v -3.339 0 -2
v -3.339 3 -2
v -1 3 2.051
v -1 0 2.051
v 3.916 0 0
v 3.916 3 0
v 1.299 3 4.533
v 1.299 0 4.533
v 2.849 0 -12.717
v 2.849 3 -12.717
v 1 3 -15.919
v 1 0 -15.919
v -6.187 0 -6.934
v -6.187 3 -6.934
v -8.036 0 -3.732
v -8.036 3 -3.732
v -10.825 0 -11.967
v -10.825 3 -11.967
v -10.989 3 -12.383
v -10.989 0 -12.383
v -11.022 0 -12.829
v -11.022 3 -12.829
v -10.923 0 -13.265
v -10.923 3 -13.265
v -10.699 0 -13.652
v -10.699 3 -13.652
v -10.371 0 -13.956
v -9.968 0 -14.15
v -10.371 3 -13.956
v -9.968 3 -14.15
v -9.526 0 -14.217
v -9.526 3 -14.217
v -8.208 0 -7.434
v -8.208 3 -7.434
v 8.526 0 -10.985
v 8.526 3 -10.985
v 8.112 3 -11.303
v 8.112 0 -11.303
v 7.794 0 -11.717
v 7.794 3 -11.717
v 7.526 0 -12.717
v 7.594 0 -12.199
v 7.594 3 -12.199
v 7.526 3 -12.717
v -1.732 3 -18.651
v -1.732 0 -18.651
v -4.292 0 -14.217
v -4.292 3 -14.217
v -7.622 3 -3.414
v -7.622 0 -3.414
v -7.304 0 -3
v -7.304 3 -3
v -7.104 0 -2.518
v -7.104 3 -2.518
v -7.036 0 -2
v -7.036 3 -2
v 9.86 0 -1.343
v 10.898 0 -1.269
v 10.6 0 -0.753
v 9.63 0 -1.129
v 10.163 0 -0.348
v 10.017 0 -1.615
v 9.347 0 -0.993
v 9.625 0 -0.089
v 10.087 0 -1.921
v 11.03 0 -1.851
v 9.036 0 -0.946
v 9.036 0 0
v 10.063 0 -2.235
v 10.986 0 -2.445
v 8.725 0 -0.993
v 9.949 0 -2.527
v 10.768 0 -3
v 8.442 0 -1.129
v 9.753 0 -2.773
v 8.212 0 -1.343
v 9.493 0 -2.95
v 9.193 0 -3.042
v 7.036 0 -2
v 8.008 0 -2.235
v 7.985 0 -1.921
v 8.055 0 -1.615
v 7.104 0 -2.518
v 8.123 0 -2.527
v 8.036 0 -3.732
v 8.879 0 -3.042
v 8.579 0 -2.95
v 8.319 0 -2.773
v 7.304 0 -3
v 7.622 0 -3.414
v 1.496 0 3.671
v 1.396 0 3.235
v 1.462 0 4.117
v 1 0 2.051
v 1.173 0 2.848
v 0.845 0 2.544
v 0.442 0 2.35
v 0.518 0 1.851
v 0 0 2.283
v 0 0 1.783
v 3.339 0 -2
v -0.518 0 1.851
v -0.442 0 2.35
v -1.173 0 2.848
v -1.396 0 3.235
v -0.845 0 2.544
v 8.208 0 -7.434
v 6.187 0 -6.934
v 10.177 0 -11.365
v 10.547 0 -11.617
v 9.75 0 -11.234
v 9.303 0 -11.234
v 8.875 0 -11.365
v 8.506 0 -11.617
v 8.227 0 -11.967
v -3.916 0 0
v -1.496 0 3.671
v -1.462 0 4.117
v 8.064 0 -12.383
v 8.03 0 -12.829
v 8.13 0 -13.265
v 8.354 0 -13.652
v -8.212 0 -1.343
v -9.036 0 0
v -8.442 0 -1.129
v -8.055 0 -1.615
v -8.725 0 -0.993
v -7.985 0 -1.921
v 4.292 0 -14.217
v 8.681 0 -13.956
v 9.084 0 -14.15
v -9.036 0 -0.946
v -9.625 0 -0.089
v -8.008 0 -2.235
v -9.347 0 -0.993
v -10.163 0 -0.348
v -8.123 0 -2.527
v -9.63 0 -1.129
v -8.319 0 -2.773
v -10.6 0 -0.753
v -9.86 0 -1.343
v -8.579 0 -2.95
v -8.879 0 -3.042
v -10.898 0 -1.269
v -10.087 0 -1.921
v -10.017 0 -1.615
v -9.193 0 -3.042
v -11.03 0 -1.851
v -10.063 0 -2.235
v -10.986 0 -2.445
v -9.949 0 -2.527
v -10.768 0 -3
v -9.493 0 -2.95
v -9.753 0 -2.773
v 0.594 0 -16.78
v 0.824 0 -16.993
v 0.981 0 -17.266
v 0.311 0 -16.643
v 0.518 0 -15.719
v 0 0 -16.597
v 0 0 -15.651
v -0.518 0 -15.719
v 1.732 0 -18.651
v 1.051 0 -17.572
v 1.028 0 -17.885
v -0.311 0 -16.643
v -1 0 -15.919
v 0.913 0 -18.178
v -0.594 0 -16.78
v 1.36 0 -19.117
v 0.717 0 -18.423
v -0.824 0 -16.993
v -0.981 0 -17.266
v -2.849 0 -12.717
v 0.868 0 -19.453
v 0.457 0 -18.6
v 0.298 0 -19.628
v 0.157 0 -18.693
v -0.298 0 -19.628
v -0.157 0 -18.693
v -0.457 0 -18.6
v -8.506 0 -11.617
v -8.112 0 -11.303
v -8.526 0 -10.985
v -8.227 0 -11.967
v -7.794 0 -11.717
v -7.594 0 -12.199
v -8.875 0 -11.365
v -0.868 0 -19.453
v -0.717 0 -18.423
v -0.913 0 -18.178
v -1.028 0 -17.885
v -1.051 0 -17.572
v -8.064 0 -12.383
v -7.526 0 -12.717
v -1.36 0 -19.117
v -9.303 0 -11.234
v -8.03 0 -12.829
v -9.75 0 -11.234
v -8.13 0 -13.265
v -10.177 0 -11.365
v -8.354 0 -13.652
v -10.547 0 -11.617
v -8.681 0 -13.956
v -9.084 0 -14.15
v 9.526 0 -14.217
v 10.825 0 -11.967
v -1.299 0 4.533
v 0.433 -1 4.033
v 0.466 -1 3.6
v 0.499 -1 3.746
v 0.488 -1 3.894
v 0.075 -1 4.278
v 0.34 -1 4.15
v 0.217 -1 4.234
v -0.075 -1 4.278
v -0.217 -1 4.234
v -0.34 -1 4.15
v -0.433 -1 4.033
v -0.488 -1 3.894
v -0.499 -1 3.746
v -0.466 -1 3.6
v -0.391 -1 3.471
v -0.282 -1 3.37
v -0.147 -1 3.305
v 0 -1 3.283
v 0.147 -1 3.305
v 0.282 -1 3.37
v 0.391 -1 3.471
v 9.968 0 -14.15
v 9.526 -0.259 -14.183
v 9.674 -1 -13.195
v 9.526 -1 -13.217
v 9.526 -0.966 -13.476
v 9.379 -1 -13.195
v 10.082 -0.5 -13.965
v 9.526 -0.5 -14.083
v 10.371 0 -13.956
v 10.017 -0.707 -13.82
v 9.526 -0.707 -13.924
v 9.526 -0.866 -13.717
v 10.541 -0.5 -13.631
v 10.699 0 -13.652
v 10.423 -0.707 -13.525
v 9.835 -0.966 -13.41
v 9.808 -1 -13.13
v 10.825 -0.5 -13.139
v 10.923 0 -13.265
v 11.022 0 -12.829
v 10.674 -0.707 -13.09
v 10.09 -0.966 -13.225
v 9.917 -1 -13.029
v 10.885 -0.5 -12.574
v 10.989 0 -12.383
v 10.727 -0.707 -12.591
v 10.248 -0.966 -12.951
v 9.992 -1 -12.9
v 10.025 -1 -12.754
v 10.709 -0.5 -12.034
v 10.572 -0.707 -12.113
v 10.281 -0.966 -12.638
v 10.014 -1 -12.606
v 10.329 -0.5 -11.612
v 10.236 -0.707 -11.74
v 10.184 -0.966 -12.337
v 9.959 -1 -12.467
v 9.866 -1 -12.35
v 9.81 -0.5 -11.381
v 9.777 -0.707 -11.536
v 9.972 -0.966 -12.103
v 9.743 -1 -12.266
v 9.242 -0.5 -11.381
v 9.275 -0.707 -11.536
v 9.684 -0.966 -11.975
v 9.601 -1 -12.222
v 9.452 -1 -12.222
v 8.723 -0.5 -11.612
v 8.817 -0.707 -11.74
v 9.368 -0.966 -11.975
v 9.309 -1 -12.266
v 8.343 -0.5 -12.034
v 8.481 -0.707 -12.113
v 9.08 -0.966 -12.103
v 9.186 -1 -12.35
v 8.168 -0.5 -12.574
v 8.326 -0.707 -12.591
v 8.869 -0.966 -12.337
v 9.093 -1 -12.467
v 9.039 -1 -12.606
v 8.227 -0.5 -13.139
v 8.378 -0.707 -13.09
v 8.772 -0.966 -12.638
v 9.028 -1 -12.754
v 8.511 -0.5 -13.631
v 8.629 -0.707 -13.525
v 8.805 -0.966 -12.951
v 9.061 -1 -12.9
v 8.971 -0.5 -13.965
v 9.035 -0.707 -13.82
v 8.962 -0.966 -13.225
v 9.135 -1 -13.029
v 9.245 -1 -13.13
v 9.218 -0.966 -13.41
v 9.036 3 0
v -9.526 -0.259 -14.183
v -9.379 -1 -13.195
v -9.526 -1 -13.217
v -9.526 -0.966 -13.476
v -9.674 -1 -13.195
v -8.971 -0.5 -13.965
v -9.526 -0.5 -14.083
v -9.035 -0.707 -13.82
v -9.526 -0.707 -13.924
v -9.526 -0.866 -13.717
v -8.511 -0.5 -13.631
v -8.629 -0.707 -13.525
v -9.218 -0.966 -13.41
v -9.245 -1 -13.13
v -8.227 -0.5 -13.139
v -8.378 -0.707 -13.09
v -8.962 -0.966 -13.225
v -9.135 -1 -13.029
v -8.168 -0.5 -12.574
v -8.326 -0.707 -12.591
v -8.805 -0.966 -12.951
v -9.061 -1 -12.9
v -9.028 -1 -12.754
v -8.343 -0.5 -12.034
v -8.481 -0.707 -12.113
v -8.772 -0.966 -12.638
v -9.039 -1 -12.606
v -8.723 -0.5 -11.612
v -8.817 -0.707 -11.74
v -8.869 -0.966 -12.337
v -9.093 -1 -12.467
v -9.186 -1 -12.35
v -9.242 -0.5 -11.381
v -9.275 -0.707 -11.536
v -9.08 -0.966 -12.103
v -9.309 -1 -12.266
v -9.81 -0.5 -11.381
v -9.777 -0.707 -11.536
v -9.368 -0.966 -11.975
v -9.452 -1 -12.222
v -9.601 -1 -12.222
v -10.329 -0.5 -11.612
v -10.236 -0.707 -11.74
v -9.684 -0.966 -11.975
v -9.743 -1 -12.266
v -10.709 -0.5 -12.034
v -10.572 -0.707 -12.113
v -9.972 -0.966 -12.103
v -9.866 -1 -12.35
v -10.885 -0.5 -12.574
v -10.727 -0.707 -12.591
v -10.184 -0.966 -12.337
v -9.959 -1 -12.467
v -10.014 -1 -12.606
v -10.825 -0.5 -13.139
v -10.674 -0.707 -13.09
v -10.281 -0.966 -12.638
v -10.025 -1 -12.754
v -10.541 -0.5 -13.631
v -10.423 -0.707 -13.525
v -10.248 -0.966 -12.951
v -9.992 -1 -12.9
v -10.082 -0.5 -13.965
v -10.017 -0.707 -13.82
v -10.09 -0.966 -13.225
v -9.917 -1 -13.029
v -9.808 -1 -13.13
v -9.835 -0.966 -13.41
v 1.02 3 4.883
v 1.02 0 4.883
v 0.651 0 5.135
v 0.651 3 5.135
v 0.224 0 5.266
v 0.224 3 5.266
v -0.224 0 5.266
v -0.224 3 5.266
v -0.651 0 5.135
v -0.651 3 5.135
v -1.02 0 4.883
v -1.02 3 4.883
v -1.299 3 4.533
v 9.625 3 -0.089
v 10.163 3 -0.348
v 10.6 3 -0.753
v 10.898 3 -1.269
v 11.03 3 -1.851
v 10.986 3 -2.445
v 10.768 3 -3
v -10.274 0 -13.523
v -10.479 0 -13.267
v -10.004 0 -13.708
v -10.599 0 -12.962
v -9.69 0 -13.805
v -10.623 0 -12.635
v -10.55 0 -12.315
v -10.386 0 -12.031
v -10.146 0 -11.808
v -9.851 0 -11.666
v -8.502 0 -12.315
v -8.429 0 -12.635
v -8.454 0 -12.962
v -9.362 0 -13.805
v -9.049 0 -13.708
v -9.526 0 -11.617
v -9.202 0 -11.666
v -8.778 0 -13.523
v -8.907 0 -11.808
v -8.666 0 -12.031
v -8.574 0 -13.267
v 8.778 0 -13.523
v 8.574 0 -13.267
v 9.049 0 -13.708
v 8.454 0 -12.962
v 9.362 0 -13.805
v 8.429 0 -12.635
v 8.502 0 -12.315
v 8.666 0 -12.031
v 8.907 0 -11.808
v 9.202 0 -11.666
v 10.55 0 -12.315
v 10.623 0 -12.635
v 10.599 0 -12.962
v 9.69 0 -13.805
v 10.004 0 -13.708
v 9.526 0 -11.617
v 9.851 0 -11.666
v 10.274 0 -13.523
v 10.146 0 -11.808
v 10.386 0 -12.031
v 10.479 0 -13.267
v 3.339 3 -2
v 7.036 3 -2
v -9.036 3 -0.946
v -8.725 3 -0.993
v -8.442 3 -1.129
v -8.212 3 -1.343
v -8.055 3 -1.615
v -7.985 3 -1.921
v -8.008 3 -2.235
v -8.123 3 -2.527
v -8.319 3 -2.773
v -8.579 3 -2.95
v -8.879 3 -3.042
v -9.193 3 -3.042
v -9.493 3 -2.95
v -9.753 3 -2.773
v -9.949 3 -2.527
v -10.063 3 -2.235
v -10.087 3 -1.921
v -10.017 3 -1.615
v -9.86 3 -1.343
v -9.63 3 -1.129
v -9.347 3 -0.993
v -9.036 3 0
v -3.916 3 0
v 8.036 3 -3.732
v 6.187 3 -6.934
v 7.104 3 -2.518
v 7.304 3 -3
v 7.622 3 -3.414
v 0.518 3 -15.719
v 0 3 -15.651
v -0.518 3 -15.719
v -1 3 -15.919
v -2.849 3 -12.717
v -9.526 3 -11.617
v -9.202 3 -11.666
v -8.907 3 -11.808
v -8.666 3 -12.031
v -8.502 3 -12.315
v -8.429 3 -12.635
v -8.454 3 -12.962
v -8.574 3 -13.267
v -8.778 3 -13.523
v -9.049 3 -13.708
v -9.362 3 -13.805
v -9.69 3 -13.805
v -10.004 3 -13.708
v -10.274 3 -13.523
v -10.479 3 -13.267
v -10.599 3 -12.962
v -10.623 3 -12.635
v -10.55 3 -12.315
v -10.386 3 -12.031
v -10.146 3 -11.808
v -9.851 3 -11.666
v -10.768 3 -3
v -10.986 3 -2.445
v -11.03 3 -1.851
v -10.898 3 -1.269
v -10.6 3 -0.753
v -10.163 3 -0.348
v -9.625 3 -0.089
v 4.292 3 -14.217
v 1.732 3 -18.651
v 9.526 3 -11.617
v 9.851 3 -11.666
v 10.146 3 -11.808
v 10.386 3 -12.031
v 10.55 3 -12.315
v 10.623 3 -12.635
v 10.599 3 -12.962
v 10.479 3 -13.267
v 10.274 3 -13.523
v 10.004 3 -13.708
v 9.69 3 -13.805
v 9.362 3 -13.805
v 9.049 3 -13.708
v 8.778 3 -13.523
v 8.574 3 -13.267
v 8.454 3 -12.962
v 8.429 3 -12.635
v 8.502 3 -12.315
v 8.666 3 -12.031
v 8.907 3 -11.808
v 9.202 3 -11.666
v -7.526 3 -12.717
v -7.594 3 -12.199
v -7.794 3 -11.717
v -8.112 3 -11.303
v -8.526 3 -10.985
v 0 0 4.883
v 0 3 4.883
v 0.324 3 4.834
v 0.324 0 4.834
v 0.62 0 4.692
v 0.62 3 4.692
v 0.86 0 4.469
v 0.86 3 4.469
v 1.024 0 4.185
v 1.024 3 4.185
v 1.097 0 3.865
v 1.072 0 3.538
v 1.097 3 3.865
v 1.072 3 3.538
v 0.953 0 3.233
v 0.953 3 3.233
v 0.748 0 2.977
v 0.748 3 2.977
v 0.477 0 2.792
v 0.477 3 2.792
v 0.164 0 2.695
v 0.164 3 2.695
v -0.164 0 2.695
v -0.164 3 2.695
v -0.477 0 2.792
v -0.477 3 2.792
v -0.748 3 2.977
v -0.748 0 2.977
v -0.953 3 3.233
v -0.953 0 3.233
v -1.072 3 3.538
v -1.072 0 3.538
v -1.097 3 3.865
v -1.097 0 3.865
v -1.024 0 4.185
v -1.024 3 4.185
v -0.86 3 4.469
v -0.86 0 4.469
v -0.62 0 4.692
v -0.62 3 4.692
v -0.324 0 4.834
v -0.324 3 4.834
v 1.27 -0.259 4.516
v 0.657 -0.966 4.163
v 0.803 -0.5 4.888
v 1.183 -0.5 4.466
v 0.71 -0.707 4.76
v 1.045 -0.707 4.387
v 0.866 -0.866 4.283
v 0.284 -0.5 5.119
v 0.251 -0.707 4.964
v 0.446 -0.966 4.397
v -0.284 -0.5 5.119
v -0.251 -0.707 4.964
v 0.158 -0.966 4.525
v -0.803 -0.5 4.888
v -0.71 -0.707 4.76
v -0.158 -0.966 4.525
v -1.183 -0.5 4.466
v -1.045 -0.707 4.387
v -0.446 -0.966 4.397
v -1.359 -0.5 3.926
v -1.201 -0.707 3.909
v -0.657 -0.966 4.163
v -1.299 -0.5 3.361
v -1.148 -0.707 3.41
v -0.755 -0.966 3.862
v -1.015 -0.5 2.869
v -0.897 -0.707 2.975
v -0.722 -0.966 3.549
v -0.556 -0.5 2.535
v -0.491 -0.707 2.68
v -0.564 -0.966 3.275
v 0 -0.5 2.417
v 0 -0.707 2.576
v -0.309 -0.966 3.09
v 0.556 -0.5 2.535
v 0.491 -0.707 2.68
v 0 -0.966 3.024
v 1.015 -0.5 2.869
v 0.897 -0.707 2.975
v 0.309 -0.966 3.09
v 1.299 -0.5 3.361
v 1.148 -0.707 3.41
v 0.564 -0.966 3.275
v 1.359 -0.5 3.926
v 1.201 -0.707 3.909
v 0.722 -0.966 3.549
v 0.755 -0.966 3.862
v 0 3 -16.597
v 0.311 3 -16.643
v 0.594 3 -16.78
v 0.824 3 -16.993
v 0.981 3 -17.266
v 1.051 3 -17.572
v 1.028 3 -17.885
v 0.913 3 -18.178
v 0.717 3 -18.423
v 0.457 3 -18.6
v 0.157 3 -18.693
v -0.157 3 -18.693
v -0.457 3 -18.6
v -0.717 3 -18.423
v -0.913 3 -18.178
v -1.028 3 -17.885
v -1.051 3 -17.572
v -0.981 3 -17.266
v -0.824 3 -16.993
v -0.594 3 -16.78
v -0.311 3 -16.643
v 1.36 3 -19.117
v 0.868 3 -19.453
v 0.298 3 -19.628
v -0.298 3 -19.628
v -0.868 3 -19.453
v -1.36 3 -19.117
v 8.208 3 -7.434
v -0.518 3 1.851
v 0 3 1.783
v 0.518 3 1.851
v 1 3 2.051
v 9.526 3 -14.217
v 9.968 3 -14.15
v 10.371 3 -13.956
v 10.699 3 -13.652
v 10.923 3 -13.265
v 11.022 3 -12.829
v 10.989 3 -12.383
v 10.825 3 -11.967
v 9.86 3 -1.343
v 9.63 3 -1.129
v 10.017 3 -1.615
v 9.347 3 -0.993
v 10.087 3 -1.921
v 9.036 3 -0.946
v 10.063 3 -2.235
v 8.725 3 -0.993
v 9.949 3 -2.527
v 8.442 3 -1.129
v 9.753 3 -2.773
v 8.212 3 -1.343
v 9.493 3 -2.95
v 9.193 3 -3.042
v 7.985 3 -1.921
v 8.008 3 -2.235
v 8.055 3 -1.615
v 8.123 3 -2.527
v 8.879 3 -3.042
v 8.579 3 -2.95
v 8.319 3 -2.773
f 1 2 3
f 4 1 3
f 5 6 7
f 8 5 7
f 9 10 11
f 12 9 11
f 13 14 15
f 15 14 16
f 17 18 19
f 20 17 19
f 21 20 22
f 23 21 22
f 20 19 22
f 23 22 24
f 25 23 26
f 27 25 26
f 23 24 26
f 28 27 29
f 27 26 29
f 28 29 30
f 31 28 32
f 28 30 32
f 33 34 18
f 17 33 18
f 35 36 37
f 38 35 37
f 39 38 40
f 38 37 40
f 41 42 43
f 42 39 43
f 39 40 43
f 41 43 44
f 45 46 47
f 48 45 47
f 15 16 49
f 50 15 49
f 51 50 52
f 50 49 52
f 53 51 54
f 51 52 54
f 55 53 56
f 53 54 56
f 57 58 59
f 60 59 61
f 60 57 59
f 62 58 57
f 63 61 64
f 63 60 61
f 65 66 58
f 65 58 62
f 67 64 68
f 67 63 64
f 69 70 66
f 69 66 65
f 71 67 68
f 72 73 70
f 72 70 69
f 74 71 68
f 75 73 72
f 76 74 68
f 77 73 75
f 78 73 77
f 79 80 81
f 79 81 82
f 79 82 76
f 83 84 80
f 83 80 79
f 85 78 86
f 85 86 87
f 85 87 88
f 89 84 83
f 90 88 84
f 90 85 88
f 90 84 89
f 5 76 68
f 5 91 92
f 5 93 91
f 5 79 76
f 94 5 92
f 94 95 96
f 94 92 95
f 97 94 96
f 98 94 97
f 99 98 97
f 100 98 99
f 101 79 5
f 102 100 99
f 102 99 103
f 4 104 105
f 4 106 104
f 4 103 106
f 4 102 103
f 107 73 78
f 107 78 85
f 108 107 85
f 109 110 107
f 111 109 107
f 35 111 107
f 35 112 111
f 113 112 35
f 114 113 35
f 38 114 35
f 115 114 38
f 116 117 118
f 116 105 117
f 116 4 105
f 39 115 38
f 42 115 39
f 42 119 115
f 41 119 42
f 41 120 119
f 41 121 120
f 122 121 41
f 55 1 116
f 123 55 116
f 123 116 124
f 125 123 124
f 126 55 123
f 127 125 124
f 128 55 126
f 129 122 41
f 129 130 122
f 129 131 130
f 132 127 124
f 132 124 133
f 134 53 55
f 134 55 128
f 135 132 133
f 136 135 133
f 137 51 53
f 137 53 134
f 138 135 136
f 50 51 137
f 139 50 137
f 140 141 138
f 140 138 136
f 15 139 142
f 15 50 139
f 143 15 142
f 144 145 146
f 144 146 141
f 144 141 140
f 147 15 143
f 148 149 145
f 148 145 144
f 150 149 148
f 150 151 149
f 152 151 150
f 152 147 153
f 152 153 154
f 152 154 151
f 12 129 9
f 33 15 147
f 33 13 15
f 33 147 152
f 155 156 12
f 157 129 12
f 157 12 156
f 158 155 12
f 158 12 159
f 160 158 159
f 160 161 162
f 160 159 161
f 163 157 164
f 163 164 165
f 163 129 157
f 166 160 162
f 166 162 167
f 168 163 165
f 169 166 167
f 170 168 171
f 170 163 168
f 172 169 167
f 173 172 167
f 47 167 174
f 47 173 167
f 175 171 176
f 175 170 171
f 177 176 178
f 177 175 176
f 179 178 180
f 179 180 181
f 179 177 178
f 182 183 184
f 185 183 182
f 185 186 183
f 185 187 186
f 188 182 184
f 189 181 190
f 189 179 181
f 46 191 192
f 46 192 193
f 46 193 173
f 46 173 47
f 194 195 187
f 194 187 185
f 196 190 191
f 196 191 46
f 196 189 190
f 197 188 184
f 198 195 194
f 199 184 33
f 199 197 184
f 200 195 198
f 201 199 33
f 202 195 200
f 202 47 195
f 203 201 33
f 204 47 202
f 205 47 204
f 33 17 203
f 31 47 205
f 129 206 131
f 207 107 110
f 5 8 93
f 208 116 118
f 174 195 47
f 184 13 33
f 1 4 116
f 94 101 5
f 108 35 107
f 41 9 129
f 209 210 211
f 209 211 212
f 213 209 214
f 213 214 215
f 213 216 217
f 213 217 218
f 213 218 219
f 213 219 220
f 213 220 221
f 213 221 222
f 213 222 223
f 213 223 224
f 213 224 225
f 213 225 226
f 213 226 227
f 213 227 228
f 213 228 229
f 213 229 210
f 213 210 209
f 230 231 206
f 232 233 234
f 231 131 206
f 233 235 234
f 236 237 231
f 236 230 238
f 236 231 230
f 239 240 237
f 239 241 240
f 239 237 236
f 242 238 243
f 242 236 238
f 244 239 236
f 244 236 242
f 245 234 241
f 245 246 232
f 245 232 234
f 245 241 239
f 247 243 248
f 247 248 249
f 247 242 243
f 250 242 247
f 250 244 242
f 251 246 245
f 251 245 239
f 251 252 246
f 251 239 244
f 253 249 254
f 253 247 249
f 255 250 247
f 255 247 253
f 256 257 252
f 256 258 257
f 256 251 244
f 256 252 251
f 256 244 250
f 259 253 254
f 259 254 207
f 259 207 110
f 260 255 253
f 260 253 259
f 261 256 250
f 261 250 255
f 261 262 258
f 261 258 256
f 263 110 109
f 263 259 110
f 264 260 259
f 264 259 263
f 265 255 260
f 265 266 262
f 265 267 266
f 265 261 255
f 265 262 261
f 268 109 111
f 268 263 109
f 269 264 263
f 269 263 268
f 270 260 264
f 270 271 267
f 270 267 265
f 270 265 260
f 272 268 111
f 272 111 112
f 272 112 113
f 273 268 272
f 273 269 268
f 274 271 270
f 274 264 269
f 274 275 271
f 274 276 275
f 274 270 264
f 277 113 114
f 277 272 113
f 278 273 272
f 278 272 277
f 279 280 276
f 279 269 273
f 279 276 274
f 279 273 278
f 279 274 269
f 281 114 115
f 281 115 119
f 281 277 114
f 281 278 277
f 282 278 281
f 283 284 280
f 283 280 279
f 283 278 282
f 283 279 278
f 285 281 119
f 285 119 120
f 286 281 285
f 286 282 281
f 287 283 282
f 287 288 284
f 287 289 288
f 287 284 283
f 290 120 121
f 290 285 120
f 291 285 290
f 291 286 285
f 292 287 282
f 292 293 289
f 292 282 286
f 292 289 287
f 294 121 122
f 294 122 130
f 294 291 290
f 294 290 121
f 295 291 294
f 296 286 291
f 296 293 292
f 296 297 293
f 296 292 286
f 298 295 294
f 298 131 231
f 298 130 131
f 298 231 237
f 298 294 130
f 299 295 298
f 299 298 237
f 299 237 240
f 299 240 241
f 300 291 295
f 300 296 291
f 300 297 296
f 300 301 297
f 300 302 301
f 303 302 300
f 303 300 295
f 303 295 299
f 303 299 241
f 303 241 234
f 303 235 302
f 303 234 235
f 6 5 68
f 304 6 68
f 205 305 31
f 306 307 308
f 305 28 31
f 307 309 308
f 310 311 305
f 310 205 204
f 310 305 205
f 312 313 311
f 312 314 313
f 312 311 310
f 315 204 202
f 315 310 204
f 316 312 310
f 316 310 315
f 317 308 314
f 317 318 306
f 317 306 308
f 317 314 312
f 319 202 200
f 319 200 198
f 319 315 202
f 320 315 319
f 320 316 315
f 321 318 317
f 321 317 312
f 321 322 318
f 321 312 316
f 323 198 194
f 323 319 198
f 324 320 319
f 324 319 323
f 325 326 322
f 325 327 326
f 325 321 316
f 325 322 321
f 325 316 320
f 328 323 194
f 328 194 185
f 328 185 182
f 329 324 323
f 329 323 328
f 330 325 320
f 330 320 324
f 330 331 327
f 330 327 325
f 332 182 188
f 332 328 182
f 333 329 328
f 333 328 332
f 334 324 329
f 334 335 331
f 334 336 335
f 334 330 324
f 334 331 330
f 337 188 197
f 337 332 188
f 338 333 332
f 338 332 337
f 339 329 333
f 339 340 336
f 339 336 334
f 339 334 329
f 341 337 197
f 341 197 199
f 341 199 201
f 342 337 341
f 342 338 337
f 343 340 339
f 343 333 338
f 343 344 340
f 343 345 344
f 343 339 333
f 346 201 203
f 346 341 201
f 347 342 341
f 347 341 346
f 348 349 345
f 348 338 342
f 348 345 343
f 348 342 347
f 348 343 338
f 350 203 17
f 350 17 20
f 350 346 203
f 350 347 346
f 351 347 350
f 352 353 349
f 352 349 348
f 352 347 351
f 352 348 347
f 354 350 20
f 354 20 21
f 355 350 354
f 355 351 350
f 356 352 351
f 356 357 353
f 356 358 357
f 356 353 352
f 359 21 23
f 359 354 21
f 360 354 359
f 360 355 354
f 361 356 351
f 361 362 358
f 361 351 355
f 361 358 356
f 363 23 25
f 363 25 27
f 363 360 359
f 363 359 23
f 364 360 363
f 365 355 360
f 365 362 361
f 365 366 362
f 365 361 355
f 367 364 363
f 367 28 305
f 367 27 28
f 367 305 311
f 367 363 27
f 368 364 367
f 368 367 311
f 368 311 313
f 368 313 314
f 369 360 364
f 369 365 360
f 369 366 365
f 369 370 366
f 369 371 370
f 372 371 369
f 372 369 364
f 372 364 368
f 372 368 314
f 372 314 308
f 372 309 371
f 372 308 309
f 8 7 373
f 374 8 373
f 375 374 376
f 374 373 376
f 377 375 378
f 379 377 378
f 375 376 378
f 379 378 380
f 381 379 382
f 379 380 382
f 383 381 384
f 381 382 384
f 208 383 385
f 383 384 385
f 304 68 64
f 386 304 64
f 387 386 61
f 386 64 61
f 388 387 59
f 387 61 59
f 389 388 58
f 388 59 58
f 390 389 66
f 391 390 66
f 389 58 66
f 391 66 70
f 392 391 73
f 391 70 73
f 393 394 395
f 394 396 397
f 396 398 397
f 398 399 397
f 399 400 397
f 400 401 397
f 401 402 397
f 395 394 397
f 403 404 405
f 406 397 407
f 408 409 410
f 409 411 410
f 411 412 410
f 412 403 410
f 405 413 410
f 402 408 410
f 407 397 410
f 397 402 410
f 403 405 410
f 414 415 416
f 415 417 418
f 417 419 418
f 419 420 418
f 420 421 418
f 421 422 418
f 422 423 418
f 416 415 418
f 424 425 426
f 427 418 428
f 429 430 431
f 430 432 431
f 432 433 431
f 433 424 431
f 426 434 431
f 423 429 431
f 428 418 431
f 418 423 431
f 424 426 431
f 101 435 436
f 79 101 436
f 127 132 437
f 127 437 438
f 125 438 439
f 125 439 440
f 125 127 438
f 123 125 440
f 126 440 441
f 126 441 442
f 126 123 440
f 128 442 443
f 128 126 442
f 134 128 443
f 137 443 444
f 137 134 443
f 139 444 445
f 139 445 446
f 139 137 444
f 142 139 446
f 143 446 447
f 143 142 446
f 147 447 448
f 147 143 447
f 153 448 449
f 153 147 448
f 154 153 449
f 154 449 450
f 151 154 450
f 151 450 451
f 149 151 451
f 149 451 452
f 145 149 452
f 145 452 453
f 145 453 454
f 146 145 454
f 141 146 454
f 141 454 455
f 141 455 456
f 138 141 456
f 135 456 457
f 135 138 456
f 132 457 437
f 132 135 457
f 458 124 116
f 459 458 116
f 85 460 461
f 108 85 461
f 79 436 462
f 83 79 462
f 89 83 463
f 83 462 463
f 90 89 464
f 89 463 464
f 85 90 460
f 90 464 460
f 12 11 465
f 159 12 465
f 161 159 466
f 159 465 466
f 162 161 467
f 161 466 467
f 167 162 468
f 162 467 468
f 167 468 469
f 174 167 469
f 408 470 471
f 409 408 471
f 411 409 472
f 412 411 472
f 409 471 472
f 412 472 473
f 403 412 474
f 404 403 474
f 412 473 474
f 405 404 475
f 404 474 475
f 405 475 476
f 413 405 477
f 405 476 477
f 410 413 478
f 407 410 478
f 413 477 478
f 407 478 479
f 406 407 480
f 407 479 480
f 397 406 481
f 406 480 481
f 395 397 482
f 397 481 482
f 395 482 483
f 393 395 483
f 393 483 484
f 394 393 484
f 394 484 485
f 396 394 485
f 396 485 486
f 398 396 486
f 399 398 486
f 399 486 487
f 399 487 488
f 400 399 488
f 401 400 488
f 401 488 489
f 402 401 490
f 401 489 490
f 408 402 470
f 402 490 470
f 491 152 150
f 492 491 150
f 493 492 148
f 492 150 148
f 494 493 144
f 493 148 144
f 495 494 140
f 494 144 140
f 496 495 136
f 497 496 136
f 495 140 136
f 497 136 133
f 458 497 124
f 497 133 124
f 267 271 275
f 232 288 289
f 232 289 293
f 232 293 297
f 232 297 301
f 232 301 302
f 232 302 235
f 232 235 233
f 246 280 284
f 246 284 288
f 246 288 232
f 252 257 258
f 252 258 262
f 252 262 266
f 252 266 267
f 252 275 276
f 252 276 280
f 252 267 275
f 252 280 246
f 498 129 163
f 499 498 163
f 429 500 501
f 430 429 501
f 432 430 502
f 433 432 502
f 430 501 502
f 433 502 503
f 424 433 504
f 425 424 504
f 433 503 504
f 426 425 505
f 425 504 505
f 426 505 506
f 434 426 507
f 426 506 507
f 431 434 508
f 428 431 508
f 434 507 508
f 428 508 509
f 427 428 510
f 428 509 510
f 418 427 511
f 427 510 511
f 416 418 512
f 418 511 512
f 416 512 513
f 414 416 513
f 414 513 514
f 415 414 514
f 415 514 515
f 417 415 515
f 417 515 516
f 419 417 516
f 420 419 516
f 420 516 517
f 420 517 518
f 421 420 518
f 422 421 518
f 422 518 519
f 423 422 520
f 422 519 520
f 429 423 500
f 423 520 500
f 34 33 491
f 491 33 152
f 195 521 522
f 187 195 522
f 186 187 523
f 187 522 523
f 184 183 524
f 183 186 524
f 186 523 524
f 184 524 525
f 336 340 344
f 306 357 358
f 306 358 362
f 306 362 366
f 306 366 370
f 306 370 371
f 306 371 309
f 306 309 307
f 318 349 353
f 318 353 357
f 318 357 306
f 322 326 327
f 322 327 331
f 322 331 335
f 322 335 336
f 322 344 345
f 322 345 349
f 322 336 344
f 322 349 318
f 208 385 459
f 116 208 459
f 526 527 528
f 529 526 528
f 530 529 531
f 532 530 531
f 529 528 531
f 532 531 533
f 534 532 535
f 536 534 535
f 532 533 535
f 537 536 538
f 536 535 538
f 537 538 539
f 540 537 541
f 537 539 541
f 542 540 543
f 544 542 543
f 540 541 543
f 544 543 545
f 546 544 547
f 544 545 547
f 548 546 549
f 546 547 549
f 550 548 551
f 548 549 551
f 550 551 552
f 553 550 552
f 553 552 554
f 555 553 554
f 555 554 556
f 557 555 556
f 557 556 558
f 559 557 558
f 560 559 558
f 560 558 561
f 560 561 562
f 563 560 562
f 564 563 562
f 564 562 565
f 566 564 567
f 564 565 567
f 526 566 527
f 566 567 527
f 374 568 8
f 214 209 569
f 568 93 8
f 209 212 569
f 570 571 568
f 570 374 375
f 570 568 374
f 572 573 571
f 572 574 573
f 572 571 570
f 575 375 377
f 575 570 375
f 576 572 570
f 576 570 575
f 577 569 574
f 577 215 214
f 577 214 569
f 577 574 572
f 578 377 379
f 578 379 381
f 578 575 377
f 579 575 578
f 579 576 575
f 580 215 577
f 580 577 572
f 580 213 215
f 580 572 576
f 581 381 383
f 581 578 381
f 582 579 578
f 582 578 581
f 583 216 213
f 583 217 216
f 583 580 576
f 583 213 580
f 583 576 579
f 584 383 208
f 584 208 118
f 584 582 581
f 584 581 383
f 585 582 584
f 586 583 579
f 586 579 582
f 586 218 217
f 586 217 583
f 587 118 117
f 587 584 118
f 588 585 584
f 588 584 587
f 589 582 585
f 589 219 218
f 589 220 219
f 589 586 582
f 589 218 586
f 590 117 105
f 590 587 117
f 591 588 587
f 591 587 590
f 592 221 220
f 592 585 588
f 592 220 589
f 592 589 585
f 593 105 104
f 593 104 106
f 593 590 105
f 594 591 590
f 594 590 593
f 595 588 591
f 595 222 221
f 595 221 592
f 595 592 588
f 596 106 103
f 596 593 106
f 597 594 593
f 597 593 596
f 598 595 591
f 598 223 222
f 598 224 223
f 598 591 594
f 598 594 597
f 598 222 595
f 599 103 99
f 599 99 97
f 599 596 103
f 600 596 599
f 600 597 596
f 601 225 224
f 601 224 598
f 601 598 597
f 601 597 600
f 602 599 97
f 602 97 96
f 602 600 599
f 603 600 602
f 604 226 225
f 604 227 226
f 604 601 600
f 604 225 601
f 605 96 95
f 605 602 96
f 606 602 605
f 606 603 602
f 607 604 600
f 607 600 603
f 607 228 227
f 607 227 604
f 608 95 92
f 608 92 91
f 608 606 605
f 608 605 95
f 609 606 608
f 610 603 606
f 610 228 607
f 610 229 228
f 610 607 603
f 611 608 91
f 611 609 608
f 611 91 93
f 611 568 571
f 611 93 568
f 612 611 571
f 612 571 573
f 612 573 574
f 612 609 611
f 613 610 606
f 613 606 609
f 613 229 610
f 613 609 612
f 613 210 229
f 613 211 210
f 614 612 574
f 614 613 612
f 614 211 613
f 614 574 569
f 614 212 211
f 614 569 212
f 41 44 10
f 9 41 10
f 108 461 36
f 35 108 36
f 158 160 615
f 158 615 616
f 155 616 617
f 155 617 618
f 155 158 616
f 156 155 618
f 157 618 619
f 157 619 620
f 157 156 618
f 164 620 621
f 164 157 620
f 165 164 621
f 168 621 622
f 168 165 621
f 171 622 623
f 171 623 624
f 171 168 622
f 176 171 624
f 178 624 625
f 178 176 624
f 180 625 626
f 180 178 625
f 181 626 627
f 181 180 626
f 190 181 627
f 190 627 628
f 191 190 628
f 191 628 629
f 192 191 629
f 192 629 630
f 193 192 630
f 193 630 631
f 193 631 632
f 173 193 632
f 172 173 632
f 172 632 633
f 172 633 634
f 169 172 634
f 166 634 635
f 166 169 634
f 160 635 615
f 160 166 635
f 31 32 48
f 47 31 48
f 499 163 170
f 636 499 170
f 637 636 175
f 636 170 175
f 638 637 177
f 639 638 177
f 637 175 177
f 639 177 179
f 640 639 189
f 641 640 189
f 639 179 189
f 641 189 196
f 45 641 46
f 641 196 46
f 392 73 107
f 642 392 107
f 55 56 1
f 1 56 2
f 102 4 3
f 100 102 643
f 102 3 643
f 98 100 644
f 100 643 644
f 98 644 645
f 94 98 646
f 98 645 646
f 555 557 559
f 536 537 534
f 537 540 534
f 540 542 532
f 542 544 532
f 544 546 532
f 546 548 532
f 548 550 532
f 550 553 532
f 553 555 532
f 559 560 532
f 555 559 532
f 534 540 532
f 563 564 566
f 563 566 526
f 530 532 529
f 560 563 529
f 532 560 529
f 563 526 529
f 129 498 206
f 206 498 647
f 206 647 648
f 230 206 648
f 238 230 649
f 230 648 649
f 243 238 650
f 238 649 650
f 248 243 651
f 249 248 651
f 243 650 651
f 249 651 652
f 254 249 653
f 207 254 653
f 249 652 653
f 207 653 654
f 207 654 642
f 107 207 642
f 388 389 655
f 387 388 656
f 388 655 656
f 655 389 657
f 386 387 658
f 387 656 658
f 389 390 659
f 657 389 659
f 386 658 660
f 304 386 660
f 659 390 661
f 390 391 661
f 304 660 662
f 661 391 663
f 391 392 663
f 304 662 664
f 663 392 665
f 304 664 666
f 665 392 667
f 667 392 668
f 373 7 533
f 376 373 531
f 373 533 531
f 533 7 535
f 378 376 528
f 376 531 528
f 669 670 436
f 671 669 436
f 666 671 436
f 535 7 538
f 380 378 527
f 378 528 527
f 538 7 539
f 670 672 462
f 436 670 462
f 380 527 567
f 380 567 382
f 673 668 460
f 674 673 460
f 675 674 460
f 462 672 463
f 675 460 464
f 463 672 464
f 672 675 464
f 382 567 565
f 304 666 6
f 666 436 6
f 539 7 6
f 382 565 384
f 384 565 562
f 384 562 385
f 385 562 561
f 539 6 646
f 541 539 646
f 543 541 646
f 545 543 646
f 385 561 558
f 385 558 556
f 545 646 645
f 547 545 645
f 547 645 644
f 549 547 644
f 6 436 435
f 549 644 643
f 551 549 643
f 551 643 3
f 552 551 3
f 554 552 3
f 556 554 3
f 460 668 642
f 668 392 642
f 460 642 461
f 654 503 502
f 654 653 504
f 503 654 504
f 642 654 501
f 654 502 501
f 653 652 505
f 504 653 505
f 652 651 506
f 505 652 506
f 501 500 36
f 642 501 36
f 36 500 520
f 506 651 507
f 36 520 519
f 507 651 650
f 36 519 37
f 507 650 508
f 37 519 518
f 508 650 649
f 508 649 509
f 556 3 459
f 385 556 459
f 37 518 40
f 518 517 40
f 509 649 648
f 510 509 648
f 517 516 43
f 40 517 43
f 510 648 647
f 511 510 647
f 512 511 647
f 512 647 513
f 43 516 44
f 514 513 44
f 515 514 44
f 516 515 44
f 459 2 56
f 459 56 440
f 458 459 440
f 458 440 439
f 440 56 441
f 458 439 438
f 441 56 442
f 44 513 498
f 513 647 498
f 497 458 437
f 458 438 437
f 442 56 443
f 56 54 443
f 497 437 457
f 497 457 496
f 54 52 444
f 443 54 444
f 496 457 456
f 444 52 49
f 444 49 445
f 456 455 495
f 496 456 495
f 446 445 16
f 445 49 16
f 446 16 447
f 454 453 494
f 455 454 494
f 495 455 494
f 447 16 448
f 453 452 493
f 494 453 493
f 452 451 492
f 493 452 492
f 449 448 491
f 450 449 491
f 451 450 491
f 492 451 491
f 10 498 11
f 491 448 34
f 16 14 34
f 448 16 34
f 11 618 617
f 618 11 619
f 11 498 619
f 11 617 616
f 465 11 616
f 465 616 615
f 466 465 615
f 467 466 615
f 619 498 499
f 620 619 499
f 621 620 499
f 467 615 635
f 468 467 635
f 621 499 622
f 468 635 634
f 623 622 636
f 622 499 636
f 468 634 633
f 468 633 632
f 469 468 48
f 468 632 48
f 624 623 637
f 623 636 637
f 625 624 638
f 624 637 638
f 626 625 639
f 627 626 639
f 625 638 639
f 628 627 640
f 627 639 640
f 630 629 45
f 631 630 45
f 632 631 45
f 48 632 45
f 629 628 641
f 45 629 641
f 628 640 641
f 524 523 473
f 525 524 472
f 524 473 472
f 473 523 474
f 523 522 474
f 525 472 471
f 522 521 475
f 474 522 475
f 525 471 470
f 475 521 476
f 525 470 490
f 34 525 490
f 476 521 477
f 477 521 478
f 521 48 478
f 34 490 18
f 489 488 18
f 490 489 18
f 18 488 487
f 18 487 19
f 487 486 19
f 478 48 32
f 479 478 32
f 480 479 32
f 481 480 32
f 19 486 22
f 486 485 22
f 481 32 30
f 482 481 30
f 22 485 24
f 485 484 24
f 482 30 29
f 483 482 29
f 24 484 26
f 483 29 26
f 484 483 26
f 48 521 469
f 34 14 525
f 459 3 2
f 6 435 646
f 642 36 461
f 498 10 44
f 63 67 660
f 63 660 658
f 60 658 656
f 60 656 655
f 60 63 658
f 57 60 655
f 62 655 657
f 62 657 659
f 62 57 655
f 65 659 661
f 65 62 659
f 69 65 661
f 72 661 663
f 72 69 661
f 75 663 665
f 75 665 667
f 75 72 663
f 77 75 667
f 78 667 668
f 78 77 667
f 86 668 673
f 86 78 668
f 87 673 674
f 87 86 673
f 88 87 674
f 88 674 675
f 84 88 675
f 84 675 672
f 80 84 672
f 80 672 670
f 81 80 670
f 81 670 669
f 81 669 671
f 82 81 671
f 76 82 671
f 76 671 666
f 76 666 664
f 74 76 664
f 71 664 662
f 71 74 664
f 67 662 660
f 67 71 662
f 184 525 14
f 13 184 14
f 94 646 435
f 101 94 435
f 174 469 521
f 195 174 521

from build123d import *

# Parameters (mm, degrees)
SKETCH1_R           = 1.054
BOSS_EXTRUDE1_DEPTH = 3
SKETCH3_R           = 1.1
BOSS_EXTRUDE2_DEPTH = 3
CUT_EXTRUDE1_DEPTH  = 23.736281859
SKETCH4_R           = 1.5
BOSS_EXTRUDE3_DEPTH = 1
FILLET1_R           = 1


with BuildPart() as part:
    # Sketch1 → Boss-Extrude1 (new body)
    with BuildSketch(Plane(origin=(0, 0, 0), x_dir=(1, 0, 0), z_dir=(0, 1, 0))):
        with BuildLine():
            Line((0, 0), (9.035898385, 0))
            ThreePointArc((9.035898385, 0), (10.767949192, 1), (10.767949192, 3))
            Line((10.767949192, 3), (1.732050808, 18.650635095))
            ThreePointArc((1.732050808, 18.650635095), (0, 19.650635095), (-1.732050808, 18.650635095))
            Line((-1.732050808, 18.650635095), (-10.767949192, 3))
            ThreePointArc((-10.767949192, 3), (-10.767949192, 1), (-9.035898385, 0))
            Line((-9.035898385, 0), (0, 0))
        make_face()
        with Locations(Location((0, 17.650635095, 0), (0, 0, 270))):
            Circle(SKETCH1_R, mode=Mode.SUBTRACT)
        with Locations(Location((-9.035898385, 2, 0), (0, 0, 270))):
            Circle(SKETCH1_R, mode=Mode.SUBTRACT)
        with Locations(Location((9.035898385, 2, 0), (0, 0, 270))):
            Circle(SKETCH1_R, mode=Mode.SUBTRACT)
    extrude(amount=BOSS_EXTRUDE1_DEPTH)

    # Sketch3 → Boss-Extrude2 (add)
    with BuildSketch(Plane(origin=(0, 3, 0), x_dir=(1, 0, 0), z_dir=(0, 1, 0))):
        with BuildLine():
            Line((-9.526279442, 14.216878365), (9.526279442, 14.216878365))
            ThreePointArc((9.526279442, 14.216878365), (10.825317547, 13.466878365), (10.825317547, 11.966878365))
            Line((10.825317547, 11.966878365), (1.299038106, -4.533121635))
            ThreePointArc((1.299038106, -4.533121635), (0, -5.283121635), (-1.299038106, -4.533121635))
            Line((-1.299038106, -4.533121635), (-10.825317547, 11.966878365))
            ThreePointArc((-10.825317547, 11.966878365), (-10.825317547, 13.466878365), (-9.526279442, 14.216878365))
        make_face()
        with Locations(Location((0, -3.783121635, 0), (0, 0, 270))):
            Circle(SKETCH3_R, mode=Mode.SUBTRACT)
        with Locations(Location((-9.526279442, 12.716878365, 0), (0, 0, 270))):
            Circle(SKETCH3_R, mode=Mode.SUBTRACT)
        with Locations(Location((9.526279442, 12.716878365, 0), (0, 0, 270))):
            Circle(SKETCH3_R, mode=Mode.SUBTRACT)
    extrude(amount=-BOSS_EXTRUDE2_DEPTH)

    # Sketch2 → Cut-Extrude1 (cut, through all)
    with BuildSketch(Plane(origin=(0, 3, 0), x_dir=(1, 0, 0), z_dir=(0, 1, 0))):
        with BuildLine():
            Line((-1, 15.918584287), (-2.848505776, 12.716878365))
            Line((-2.848505776, 12.716878365), (-7.526279442, 12.716878365))
            ThreePointArc((-7.526279442, 12.716878365), (-7.794228634, 11.716878365), (-8.526279442, 10.984827557))
            Line((-8.526279442, 10.984827557), (-6.187392609, 6.93375673))
            Line((-6.187392609, 6.93375673), (-8.035898385, 3.732050808))
            ThreePointArc((-8.035898385, 3.732050808), (-7.303847577, 3), (-7.035898385, 2))
            Line((-7.035898385, 2), (-3.338886833, 2))
            Line((-3.338886833, 2), (-1, -2.051070828))
            ThreePointArc((-1, -2.051070828), (0, -1.783121635), (1, -2.051070828))
            Line((1, -2.051070828), (3.338886833, 2))
            Line((3.338886833, 2), (7.035898385, 2))
            ThreePointArc((7.035898385, 2), (7.303847577, 3), (8.035898385, 3.732050808))
            Line((8.035898385, 3.732050808), (6.187392609, 6.93375673))
            Line((6.187392609, 6.93375673), (8.526279442, 10.984827557))
            ThreePointArc((8.526279442, 10.984827557), (7.794228634, 11.716878365), (7.526279442, 12.716878365))
            Line((7.526279442, 12.716878365), (2.848505776, 12.716878365))
            Line((2.848505776, 12.716878365), (1, 15.918584287))
            ThreePointArc((1, 15.918584287), (0, 15.650635095), (-1, 15.918584287))
        make_face()
    extrude(amount=-CUT_EXTRUDE1_DEPTH, mode=Mode.SUBTRACT)

    # Sketch4 → Boss-Extrude3 (add)
    with BuildSketch(Plane.XZ):
        with Locations(Location((0, 3.783121635, 0), (0, 0, 30))):
            Circle(SKETCH4_R)
        with Locations(Location((9.526279442, -12.716878365, 0), (0, 0, 270))):
            Circle(SKETCH4_R)
        with Locations(Location((-9.526279442, -12.716878365, 0), (0, 0, 270))):
            Circle(SKETCH4_R)
    extrude(amount=BOSS_EXTRUDE3_DEPTH)

    # Fillet1
    fillet1_edges = [part.edges().sort_by_distance(p)[0] for p in [
        (-1.299038106, -1, 3.033121635),
        (9.526279442, -1, -11.216878365),
        (-9.526279442, -1, -11.216878365),
    ]]
    fillet(fillet1_edges, radius=FILLET1_R - 0.0001)  # a hair under: the kernel refuses the full size


solid = part.part
